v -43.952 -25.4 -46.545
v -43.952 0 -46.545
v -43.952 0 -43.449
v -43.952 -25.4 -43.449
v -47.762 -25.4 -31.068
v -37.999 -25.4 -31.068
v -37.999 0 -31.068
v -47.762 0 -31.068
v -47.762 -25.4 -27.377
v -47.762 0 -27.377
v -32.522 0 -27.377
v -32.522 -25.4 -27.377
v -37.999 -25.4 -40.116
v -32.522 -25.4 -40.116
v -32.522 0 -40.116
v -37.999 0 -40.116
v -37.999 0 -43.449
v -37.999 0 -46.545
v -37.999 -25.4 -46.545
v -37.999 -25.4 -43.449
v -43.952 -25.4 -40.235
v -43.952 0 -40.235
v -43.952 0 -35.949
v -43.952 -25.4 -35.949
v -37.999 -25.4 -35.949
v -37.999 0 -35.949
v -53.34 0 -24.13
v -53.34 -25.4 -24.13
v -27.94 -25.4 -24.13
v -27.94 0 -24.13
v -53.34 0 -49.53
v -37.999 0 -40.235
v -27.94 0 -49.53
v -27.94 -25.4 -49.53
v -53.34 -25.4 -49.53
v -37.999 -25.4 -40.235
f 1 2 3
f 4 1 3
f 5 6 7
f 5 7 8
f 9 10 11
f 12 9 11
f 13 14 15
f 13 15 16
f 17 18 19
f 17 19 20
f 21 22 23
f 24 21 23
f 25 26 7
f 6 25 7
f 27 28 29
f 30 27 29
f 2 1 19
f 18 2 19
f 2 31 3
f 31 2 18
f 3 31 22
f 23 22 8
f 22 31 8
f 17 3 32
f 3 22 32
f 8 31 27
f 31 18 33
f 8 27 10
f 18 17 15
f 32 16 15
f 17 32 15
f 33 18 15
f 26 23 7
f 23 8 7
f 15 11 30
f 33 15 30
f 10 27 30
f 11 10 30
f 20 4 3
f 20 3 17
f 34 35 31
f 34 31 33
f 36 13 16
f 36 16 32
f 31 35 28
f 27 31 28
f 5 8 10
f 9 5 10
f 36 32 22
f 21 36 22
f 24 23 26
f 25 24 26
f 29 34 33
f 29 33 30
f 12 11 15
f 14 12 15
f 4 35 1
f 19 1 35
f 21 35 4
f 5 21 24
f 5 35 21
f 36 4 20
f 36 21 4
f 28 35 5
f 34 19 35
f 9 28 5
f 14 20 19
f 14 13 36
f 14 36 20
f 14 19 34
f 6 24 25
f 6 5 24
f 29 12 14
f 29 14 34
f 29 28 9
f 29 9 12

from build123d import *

# Parameters (mm, degrees)
F0_W     = 25.4
F0_H     = 25.4
F0_W_2   = 5.953182
F0_H_2   = 3.095396
F1_DEPTH = 25.4


with BuildPart() as f1:
    # F0 (on Front) → F1 (new body)
    with BuildSketch(Plane.XZ):
        with Locations((-40.640003, -36.830003)):
            Rectangle(F0_W, F0_H)
        with Locations((-40.975282, -44.996828)):
            Rectangle(F0_W_2, F0_H_2, mode=Mode.SUBTRACT)
        Polygon((-37.998691, -40.234677), (-43.951873, -40.234677), (-43.951873, -35.948742), (-37.998691, -35.948742), (-37.998691, -31.067541), (-43.951873, -31.067541), (-47.761906, -31.067541), (-47.761906, -27.376875), (-43.951873, -27.376875), (-37.998691, -27.376875), (-32.521766, -27.376875), (-32.521766, -31.067541), (-32.521766, -35.948742), (-32.521766, -40.115625), (-37.998691, -40.115625), align=None, mode=Mode.SUBTRACT)
    extrude(amount=F1_DEPTH)


solid = f1.part
